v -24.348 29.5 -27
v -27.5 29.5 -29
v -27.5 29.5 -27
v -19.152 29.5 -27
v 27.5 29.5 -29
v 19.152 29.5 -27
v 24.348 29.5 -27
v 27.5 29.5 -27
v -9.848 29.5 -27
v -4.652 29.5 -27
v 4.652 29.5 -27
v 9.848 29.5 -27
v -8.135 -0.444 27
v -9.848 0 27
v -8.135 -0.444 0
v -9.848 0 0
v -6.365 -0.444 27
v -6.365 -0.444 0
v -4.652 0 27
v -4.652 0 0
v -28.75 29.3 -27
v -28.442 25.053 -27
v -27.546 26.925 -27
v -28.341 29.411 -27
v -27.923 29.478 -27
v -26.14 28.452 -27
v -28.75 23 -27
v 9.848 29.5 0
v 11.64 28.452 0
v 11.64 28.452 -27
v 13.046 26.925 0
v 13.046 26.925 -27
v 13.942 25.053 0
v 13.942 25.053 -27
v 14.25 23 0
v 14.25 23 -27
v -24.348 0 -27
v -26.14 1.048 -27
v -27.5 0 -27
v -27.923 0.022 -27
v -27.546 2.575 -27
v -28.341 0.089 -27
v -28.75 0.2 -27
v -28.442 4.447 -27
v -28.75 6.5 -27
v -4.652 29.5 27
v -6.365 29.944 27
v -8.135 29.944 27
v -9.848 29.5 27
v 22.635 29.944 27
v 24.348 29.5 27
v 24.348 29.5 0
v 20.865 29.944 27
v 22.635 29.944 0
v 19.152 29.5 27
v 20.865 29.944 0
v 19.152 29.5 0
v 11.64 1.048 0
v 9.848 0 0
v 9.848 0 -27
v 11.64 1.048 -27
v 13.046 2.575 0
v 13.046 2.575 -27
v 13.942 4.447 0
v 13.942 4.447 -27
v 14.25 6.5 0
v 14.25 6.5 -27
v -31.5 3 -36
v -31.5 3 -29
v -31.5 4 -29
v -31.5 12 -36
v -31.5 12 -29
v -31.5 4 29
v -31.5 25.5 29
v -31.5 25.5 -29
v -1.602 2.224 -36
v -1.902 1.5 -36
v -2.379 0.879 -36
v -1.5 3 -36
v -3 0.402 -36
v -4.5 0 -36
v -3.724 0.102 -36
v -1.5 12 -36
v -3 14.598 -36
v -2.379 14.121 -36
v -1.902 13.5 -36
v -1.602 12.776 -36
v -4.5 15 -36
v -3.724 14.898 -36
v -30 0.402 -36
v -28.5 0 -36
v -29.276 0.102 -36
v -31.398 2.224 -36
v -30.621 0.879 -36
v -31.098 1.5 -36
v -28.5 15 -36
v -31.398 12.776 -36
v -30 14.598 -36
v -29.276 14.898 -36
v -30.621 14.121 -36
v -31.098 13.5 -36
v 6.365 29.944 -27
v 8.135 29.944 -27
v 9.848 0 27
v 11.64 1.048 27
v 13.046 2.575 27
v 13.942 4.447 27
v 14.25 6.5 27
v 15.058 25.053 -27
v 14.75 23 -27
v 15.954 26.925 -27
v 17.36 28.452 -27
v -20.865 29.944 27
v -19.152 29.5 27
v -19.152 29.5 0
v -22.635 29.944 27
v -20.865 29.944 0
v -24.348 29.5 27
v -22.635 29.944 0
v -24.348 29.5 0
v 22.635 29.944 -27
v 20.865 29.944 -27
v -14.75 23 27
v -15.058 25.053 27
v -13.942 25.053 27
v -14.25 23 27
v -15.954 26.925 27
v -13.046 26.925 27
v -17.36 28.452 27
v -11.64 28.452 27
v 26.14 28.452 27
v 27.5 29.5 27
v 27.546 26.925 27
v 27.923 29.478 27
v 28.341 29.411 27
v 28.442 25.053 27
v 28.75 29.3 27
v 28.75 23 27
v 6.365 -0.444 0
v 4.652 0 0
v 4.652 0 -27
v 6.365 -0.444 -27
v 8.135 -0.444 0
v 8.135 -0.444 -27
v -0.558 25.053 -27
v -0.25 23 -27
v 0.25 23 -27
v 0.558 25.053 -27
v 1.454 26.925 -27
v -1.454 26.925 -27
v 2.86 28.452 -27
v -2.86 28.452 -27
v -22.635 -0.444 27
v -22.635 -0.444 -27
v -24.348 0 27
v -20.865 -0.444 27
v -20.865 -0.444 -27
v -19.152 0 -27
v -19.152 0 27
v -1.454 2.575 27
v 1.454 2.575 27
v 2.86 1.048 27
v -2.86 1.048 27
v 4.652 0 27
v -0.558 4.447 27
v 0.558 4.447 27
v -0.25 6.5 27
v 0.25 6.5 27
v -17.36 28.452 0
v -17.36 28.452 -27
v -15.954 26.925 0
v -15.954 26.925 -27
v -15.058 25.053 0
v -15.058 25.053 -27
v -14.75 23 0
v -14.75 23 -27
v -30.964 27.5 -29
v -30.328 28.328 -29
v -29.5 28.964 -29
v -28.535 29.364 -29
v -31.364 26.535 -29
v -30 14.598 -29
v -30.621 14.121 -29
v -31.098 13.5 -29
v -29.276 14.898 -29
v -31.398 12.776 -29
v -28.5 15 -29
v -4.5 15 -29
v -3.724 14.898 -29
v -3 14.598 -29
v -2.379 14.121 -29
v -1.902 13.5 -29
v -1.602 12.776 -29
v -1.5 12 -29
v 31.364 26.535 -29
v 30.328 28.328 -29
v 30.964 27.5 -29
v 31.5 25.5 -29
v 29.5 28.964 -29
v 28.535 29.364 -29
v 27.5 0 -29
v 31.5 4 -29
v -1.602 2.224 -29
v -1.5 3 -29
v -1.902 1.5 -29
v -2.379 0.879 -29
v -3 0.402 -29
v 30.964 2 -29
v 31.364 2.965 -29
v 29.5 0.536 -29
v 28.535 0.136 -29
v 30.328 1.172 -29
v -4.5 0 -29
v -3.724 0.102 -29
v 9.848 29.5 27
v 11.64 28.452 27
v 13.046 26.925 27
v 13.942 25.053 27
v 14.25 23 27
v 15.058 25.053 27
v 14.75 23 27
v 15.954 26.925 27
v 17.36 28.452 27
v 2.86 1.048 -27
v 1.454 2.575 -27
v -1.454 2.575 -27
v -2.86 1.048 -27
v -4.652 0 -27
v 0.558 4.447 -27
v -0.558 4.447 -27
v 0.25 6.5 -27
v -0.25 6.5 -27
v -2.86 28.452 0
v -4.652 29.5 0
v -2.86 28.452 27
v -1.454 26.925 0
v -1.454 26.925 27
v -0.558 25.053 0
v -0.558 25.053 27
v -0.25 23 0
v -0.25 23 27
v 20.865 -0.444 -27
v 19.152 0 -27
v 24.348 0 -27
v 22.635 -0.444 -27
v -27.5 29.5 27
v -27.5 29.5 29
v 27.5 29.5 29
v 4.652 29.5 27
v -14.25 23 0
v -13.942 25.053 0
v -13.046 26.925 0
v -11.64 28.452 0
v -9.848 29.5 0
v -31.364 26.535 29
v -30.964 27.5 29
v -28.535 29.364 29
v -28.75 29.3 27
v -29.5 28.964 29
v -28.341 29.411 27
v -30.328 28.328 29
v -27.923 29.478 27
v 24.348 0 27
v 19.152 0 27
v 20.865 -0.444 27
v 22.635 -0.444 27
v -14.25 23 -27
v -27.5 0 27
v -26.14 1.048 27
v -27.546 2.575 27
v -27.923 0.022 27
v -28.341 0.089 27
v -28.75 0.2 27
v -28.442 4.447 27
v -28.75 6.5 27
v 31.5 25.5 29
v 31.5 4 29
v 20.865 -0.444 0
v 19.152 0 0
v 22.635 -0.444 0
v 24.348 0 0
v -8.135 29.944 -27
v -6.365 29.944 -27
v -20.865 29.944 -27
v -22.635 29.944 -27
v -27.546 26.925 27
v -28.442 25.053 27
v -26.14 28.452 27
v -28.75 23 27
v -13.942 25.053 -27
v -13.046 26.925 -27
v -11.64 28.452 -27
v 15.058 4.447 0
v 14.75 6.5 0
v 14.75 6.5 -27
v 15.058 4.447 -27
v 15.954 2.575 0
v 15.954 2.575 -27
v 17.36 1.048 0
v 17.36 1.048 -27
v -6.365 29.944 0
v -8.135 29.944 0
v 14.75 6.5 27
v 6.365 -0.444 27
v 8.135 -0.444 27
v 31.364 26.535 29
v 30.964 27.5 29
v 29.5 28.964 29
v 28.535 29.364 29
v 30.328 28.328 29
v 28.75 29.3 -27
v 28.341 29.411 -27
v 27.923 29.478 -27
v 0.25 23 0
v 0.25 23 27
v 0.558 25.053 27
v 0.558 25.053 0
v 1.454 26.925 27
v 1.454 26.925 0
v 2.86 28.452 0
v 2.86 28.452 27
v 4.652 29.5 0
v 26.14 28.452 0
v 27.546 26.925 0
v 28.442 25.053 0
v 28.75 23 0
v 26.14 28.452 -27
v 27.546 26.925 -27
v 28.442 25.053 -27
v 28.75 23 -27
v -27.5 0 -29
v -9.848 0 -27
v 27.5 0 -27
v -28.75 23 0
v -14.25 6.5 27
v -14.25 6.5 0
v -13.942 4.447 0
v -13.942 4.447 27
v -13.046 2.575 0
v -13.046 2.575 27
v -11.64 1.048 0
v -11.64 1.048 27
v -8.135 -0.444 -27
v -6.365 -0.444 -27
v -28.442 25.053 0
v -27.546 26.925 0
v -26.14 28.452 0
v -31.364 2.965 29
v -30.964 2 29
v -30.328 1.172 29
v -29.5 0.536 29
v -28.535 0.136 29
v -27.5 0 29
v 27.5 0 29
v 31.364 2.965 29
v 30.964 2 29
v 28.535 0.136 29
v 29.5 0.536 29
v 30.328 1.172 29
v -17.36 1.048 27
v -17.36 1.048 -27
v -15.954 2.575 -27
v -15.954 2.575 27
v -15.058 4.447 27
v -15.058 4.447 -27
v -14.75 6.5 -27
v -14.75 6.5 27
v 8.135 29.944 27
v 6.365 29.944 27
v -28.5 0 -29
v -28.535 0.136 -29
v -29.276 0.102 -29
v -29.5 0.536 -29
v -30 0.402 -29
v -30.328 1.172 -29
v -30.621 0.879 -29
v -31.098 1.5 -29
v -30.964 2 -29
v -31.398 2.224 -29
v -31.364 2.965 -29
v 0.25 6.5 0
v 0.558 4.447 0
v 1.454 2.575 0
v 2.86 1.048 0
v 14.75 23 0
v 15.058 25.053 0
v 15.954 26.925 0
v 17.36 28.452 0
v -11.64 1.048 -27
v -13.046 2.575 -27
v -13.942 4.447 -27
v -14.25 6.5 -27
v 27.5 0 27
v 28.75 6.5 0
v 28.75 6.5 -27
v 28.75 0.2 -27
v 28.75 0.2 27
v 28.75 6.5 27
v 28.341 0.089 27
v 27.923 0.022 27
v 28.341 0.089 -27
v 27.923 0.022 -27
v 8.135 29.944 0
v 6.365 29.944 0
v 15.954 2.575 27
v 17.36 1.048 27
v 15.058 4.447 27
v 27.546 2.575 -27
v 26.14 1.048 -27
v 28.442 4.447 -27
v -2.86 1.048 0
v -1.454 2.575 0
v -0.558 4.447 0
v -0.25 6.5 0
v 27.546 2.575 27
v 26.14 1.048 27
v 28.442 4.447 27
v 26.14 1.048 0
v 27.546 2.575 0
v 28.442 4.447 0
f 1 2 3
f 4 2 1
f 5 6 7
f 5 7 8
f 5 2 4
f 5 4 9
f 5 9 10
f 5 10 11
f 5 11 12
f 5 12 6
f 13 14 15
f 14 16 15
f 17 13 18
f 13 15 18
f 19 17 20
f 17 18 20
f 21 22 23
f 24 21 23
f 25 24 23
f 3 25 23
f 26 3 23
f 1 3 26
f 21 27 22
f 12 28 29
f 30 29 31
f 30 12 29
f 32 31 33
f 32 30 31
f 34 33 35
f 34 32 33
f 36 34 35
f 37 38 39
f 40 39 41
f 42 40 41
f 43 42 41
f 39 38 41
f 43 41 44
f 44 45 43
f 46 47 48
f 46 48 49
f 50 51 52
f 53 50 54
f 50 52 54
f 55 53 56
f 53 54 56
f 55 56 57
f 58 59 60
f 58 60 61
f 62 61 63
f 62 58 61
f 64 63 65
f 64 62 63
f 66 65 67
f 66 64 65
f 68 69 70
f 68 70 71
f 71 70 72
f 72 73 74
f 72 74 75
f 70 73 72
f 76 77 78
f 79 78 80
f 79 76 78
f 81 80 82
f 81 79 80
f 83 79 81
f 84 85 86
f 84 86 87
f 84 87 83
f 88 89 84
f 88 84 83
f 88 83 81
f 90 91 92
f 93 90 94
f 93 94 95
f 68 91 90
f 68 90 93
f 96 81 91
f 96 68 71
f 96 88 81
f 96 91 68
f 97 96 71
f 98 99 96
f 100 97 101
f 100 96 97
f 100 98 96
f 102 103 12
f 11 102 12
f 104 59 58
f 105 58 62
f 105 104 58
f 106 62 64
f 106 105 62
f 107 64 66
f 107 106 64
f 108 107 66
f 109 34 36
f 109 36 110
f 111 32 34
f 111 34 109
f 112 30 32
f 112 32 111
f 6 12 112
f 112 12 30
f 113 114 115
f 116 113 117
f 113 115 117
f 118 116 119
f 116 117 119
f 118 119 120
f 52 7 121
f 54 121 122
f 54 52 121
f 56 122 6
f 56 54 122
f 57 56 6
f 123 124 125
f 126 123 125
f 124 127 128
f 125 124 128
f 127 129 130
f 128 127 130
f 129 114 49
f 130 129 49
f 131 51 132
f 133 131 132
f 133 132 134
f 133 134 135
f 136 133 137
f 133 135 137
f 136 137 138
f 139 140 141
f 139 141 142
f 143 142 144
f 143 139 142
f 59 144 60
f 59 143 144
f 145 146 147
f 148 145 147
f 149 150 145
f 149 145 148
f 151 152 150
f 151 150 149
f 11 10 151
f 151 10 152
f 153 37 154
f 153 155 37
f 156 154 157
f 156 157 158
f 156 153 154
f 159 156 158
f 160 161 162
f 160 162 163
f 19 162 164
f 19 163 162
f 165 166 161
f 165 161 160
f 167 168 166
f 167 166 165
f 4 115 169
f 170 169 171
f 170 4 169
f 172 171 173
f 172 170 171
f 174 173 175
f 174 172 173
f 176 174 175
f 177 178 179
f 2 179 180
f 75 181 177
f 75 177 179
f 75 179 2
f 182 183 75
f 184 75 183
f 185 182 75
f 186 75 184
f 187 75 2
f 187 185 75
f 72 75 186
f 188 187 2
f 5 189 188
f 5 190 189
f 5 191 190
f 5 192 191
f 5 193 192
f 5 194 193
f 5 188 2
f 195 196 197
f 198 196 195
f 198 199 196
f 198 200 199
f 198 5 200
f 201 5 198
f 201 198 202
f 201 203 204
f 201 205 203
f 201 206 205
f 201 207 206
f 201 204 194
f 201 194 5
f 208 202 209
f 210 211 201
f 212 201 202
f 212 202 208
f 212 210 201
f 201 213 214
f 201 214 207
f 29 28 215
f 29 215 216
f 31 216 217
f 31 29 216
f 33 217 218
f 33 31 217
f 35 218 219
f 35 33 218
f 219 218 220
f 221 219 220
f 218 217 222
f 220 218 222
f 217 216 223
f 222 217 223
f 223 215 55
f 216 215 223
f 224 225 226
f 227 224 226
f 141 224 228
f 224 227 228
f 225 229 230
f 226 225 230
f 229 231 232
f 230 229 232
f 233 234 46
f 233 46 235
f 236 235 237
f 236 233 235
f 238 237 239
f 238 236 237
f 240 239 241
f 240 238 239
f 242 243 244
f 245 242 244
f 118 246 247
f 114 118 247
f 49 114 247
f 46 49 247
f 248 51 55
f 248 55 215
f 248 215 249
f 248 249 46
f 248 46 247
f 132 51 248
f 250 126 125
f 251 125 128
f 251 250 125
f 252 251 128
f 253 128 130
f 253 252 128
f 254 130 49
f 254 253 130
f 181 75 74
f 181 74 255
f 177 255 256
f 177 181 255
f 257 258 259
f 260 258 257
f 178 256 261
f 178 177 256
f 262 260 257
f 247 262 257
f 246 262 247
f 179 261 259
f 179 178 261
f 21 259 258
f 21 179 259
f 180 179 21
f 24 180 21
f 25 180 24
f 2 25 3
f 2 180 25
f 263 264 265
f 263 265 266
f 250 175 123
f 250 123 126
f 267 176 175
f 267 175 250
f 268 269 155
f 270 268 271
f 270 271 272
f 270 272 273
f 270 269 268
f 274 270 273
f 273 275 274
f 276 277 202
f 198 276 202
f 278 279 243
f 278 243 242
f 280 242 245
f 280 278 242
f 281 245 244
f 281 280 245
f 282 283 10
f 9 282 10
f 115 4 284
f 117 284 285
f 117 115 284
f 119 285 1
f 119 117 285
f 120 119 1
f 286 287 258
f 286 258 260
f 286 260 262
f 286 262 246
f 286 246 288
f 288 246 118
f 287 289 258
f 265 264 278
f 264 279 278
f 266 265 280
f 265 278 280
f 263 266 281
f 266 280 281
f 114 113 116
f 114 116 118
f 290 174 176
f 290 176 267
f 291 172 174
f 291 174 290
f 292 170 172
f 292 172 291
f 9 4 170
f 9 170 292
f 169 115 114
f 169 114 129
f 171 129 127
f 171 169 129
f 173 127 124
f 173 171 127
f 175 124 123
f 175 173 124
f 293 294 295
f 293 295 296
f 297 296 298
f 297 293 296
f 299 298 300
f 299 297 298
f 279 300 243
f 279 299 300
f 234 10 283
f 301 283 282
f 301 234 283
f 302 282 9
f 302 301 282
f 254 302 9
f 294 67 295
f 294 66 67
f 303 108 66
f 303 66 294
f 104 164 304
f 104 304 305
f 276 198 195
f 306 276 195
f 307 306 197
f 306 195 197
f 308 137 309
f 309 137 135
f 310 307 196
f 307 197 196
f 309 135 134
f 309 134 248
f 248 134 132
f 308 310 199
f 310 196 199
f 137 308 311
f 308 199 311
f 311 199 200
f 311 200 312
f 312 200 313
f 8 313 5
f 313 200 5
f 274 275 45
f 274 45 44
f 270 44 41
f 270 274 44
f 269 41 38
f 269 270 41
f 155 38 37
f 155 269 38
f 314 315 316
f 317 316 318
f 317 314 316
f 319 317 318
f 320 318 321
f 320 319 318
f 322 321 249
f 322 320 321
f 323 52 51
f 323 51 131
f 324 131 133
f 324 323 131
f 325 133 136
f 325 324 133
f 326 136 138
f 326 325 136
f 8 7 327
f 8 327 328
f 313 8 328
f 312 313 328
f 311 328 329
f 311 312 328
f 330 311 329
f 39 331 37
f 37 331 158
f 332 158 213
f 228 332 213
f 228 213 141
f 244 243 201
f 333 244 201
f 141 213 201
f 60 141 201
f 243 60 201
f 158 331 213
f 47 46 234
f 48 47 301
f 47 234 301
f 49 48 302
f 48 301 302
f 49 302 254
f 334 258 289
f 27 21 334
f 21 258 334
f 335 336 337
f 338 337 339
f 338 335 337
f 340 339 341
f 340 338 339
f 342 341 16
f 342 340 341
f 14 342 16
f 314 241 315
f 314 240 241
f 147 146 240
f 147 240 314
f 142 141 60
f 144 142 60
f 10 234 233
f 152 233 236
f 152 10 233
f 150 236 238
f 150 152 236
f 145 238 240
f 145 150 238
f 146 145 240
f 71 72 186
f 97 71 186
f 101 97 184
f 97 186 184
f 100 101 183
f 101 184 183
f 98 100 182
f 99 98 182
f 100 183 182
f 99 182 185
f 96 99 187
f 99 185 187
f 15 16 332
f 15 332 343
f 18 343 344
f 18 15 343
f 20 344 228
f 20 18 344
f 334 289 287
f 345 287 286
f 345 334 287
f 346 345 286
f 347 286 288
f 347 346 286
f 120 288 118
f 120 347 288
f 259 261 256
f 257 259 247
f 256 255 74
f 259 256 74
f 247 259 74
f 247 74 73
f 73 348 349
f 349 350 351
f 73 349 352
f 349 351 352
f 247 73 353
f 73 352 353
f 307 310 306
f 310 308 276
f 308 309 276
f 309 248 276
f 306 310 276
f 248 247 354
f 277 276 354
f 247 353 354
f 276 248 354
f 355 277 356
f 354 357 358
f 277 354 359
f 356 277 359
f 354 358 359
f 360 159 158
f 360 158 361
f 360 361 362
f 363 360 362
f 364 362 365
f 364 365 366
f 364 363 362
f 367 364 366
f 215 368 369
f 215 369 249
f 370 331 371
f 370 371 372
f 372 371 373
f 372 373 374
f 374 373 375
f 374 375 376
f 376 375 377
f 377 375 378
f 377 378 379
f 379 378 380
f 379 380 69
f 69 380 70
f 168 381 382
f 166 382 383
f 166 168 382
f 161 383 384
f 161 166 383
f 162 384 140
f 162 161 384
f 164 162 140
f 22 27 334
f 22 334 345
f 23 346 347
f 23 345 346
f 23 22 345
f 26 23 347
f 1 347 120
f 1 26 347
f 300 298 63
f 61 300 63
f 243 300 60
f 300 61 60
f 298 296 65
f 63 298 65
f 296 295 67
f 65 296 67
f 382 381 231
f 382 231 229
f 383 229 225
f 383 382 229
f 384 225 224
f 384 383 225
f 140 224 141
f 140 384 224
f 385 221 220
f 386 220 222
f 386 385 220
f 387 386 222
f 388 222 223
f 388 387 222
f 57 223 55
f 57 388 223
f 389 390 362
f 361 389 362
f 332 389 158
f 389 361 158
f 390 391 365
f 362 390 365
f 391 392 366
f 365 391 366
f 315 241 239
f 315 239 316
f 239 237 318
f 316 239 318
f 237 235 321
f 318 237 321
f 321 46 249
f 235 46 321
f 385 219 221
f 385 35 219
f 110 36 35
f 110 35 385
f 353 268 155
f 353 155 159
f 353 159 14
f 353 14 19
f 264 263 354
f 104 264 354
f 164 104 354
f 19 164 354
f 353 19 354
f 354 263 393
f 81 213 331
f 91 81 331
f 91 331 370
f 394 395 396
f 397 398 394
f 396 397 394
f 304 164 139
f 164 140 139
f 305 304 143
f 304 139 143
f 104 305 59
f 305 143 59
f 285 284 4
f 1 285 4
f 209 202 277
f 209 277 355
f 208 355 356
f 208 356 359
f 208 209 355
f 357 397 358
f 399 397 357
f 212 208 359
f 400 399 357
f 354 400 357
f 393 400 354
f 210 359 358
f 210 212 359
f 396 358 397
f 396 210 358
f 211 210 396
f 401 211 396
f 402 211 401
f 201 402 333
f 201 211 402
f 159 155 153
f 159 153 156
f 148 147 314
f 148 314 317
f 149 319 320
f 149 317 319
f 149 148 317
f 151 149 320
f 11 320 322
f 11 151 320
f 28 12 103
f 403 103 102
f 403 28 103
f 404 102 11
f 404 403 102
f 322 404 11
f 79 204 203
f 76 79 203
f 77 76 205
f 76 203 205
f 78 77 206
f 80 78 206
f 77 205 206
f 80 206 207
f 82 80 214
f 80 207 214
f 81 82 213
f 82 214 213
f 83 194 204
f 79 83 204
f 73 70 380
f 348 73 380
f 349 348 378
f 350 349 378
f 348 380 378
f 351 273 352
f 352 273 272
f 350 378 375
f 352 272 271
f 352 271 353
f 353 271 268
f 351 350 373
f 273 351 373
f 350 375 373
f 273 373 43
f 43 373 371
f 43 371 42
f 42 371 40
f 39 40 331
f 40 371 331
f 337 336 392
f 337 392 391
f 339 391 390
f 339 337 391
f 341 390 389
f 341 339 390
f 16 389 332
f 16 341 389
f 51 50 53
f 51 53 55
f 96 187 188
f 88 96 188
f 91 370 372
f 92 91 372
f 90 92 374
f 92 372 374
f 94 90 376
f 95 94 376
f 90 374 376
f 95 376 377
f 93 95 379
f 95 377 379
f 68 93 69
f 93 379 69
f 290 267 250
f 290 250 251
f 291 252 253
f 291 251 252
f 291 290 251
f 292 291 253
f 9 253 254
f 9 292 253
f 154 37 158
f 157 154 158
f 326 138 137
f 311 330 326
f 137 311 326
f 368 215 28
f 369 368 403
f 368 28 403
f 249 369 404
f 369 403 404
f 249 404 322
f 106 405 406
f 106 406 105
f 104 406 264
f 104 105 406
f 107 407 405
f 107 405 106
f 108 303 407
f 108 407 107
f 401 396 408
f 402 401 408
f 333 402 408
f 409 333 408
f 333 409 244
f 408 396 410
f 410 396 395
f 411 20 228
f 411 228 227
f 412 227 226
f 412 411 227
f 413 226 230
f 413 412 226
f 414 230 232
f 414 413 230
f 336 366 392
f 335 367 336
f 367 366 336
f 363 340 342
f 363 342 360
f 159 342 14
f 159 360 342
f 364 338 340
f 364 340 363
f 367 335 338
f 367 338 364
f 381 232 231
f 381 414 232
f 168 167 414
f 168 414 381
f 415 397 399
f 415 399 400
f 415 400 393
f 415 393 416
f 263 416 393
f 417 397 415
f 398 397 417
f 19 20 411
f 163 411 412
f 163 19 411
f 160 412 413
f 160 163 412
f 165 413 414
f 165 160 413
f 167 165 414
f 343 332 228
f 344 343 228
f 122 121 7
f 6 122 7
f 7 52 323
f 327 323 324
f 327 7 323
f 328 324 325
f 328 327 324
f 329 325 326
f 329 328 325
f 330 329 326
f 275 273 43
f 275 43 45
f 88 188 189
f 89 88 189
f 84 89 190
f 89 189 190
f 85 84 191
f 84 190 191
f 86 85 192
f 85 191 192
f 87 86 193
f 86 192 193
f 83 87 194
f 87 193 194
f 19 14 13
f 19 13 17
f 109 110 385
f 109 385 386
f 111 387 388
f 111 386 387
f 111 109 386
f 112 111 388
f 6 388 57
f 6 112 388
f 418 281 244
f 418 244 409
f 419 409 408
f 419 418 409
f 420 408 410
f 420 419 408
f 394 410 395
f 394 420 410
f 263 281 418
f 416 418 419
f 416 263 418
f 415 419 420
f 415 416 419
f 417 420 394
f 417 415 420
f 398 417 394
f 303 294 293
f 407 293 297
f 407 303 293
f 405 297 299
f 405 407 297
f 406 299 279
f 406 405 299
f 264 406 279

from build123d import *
from build123d.topology import SkipClean

# Parameters (mm, degrees)
SKETCH1_W           = 63
SKETCH1_H           = 58
BOSS_EXTRUDE1_DEPTH = 29.5
FILLET1_R           = 4
CUT_EXTRUDE1_DEPTH  = 27
SKETCH3_R           = 7
BOSS_EXTRUDE2_DEPTH = 27
BOSS_EXTRUDE3_DEPTH = 7


with BuildPart() as part:
    # Sketch1 → Boss-Extrude1 (new body)
    with BuildSketch(Plane(origin=(0, 0, 0), x_dir=(1, 0, 0), z_dir=(0, 1, 0))):
        Rectangle(SKETCH1_W, SKETCH1_H)
    extrude(amount=BOSS_EXTRUDE1_DEPTH)

    # Fillet1
    fillet1_edges = [part.edges().sort_by_distance(p)[0] for p in [
        (-31.5, 29.5, 0),
        (31.5, 29.5, 0),
        (-31.5, 0, 0),
        (31.5, 0, 0),
    ]]
    fillet(fillet1_edges, radius=FILLET1_R)

    # Sketch2 → Cut-Extrude1 (cut, symmetric)
    with BuildSketch(Plane.XY):
        with BuildLine():
            Line((-14.75, 23), (-14.25, 23))
            ThreePointArc((-14.25, 23), (-7.25, 30), (-0.25, 23))
            Line((-0.25, 23), (0.25, 23))
            ThreePointArc((0.25, 23), (7.25, 30), (14.25, 23))
            Line((14.25, 23), (14.75, 23))
            ThreePointArc((14.75, 23), (21.75, 30), (28.75, 23))
            Line((28.75, 23), (28.75, 32.890330219))
            Line((28.75, 32.890330219), (-28.75, 32.890330219))
            Line((-28.75, 32.890330219), (-28.75, 23))
            ThreePointArc((-28.75, 23), (-21.75, 30), (-14.75, 23))
        make_face()
        with BuildLine():
            Line((-14.75, 6.5), (-14.25, 6.5))
            ThreePointArc((-14.25, 6.5), (-7.25, -0.5), (-0.25, 6.5))
            Line((-0.25, 6.5), (0.25, 6.5))
            ThreePointArc((0.25, 6.5), (7.25, -0.5), (14.25, 6.5))
            Line((14.25, 6.5), (14.75, 6.5))
            ThreePointArc((14.75, 6.5), (21.75, -0.5), (28.75, 6.5))
            Line((28.75, 6.5), (28.75, -3.999416428))
            Line((28.75, -3.999416428), (-28.75, -3.472007121))
            Line((-28.75, -3.472007121), (-28.75, 6.5))
            ThreePointArc((-28.75, 6.5), (-21.75, -0.5), (-14.75, 6.5))
        make_face()
    extrude(amount=CUT_EXTRUDE1_DEPTH, both=True, mode=Mode.SUBTRACT)

    # Sketch3 → Boss-Extrude2 (add, symmetric)
    with SkipClean():  # the faces are left unmerged after this step: merging them gives an invalid solid
        with BuildSketch(Plane.XY):
            with Locations((-21.75, 23)):
                Circle(SKETCH3_R)
            with Locations((-7.25, 23)):
                Circle(SKETCH3_R)
            with Locations((7.25, 23)):
                Circle(SKETCH3_R)
            with Locations((21.75, 23)):
                Circle(SKETCH3_R)
            with Locations((21.75, 6.5)):
                Circle(SKETCH3_R)
            with Locations((7.25, 6.5)):
                Circle(SKETCH3_R)
            with Locations((-7.25, 6.5)):
                Circle(SKETCH3_R)
            with Locations((-21.75, 6.5)):
                Circle(SKETCH3_R)
        extrude(amount=BOSS_EXTRUDE2_DEPTH, both=True)

    # Sketch4 → Boss-Extrude3 (add)
    with SkipClean():  # the faces are left unmerged after this step: merging them gives an invalid solid
        with BuildSketch(Plane(origin=(0, 0, -29), x_dir=(-1, 0, 0), z_dir=(0, 0, -1))):
            with BuildLine():
                Line((28.5, 15), (4.5, 15))
                ThreePointArc((4.5, 15), (2.378679656, 14.121320344), (1.5, 12))
                Line((1.5, 12), (1.5, 3))
                ThreePointArc((1.5, 3), (2.378679656, 0.878679656), (4.5, 0))
                Line((4.5, 0), (28.5, 0))
                ThreePointArc((28.5, 0), (30.621320344, 0.878679656), (31.5, 3))
                Line((31.5, 3), (31.5, 12))
                ThreePointArc((31.5, 12), (30.621320344, 14.121320344), (28.5, 15))
            make_face()
        extrude(amount=BOSS_EXTRUDE3_DEPTH)


solid = part.part
